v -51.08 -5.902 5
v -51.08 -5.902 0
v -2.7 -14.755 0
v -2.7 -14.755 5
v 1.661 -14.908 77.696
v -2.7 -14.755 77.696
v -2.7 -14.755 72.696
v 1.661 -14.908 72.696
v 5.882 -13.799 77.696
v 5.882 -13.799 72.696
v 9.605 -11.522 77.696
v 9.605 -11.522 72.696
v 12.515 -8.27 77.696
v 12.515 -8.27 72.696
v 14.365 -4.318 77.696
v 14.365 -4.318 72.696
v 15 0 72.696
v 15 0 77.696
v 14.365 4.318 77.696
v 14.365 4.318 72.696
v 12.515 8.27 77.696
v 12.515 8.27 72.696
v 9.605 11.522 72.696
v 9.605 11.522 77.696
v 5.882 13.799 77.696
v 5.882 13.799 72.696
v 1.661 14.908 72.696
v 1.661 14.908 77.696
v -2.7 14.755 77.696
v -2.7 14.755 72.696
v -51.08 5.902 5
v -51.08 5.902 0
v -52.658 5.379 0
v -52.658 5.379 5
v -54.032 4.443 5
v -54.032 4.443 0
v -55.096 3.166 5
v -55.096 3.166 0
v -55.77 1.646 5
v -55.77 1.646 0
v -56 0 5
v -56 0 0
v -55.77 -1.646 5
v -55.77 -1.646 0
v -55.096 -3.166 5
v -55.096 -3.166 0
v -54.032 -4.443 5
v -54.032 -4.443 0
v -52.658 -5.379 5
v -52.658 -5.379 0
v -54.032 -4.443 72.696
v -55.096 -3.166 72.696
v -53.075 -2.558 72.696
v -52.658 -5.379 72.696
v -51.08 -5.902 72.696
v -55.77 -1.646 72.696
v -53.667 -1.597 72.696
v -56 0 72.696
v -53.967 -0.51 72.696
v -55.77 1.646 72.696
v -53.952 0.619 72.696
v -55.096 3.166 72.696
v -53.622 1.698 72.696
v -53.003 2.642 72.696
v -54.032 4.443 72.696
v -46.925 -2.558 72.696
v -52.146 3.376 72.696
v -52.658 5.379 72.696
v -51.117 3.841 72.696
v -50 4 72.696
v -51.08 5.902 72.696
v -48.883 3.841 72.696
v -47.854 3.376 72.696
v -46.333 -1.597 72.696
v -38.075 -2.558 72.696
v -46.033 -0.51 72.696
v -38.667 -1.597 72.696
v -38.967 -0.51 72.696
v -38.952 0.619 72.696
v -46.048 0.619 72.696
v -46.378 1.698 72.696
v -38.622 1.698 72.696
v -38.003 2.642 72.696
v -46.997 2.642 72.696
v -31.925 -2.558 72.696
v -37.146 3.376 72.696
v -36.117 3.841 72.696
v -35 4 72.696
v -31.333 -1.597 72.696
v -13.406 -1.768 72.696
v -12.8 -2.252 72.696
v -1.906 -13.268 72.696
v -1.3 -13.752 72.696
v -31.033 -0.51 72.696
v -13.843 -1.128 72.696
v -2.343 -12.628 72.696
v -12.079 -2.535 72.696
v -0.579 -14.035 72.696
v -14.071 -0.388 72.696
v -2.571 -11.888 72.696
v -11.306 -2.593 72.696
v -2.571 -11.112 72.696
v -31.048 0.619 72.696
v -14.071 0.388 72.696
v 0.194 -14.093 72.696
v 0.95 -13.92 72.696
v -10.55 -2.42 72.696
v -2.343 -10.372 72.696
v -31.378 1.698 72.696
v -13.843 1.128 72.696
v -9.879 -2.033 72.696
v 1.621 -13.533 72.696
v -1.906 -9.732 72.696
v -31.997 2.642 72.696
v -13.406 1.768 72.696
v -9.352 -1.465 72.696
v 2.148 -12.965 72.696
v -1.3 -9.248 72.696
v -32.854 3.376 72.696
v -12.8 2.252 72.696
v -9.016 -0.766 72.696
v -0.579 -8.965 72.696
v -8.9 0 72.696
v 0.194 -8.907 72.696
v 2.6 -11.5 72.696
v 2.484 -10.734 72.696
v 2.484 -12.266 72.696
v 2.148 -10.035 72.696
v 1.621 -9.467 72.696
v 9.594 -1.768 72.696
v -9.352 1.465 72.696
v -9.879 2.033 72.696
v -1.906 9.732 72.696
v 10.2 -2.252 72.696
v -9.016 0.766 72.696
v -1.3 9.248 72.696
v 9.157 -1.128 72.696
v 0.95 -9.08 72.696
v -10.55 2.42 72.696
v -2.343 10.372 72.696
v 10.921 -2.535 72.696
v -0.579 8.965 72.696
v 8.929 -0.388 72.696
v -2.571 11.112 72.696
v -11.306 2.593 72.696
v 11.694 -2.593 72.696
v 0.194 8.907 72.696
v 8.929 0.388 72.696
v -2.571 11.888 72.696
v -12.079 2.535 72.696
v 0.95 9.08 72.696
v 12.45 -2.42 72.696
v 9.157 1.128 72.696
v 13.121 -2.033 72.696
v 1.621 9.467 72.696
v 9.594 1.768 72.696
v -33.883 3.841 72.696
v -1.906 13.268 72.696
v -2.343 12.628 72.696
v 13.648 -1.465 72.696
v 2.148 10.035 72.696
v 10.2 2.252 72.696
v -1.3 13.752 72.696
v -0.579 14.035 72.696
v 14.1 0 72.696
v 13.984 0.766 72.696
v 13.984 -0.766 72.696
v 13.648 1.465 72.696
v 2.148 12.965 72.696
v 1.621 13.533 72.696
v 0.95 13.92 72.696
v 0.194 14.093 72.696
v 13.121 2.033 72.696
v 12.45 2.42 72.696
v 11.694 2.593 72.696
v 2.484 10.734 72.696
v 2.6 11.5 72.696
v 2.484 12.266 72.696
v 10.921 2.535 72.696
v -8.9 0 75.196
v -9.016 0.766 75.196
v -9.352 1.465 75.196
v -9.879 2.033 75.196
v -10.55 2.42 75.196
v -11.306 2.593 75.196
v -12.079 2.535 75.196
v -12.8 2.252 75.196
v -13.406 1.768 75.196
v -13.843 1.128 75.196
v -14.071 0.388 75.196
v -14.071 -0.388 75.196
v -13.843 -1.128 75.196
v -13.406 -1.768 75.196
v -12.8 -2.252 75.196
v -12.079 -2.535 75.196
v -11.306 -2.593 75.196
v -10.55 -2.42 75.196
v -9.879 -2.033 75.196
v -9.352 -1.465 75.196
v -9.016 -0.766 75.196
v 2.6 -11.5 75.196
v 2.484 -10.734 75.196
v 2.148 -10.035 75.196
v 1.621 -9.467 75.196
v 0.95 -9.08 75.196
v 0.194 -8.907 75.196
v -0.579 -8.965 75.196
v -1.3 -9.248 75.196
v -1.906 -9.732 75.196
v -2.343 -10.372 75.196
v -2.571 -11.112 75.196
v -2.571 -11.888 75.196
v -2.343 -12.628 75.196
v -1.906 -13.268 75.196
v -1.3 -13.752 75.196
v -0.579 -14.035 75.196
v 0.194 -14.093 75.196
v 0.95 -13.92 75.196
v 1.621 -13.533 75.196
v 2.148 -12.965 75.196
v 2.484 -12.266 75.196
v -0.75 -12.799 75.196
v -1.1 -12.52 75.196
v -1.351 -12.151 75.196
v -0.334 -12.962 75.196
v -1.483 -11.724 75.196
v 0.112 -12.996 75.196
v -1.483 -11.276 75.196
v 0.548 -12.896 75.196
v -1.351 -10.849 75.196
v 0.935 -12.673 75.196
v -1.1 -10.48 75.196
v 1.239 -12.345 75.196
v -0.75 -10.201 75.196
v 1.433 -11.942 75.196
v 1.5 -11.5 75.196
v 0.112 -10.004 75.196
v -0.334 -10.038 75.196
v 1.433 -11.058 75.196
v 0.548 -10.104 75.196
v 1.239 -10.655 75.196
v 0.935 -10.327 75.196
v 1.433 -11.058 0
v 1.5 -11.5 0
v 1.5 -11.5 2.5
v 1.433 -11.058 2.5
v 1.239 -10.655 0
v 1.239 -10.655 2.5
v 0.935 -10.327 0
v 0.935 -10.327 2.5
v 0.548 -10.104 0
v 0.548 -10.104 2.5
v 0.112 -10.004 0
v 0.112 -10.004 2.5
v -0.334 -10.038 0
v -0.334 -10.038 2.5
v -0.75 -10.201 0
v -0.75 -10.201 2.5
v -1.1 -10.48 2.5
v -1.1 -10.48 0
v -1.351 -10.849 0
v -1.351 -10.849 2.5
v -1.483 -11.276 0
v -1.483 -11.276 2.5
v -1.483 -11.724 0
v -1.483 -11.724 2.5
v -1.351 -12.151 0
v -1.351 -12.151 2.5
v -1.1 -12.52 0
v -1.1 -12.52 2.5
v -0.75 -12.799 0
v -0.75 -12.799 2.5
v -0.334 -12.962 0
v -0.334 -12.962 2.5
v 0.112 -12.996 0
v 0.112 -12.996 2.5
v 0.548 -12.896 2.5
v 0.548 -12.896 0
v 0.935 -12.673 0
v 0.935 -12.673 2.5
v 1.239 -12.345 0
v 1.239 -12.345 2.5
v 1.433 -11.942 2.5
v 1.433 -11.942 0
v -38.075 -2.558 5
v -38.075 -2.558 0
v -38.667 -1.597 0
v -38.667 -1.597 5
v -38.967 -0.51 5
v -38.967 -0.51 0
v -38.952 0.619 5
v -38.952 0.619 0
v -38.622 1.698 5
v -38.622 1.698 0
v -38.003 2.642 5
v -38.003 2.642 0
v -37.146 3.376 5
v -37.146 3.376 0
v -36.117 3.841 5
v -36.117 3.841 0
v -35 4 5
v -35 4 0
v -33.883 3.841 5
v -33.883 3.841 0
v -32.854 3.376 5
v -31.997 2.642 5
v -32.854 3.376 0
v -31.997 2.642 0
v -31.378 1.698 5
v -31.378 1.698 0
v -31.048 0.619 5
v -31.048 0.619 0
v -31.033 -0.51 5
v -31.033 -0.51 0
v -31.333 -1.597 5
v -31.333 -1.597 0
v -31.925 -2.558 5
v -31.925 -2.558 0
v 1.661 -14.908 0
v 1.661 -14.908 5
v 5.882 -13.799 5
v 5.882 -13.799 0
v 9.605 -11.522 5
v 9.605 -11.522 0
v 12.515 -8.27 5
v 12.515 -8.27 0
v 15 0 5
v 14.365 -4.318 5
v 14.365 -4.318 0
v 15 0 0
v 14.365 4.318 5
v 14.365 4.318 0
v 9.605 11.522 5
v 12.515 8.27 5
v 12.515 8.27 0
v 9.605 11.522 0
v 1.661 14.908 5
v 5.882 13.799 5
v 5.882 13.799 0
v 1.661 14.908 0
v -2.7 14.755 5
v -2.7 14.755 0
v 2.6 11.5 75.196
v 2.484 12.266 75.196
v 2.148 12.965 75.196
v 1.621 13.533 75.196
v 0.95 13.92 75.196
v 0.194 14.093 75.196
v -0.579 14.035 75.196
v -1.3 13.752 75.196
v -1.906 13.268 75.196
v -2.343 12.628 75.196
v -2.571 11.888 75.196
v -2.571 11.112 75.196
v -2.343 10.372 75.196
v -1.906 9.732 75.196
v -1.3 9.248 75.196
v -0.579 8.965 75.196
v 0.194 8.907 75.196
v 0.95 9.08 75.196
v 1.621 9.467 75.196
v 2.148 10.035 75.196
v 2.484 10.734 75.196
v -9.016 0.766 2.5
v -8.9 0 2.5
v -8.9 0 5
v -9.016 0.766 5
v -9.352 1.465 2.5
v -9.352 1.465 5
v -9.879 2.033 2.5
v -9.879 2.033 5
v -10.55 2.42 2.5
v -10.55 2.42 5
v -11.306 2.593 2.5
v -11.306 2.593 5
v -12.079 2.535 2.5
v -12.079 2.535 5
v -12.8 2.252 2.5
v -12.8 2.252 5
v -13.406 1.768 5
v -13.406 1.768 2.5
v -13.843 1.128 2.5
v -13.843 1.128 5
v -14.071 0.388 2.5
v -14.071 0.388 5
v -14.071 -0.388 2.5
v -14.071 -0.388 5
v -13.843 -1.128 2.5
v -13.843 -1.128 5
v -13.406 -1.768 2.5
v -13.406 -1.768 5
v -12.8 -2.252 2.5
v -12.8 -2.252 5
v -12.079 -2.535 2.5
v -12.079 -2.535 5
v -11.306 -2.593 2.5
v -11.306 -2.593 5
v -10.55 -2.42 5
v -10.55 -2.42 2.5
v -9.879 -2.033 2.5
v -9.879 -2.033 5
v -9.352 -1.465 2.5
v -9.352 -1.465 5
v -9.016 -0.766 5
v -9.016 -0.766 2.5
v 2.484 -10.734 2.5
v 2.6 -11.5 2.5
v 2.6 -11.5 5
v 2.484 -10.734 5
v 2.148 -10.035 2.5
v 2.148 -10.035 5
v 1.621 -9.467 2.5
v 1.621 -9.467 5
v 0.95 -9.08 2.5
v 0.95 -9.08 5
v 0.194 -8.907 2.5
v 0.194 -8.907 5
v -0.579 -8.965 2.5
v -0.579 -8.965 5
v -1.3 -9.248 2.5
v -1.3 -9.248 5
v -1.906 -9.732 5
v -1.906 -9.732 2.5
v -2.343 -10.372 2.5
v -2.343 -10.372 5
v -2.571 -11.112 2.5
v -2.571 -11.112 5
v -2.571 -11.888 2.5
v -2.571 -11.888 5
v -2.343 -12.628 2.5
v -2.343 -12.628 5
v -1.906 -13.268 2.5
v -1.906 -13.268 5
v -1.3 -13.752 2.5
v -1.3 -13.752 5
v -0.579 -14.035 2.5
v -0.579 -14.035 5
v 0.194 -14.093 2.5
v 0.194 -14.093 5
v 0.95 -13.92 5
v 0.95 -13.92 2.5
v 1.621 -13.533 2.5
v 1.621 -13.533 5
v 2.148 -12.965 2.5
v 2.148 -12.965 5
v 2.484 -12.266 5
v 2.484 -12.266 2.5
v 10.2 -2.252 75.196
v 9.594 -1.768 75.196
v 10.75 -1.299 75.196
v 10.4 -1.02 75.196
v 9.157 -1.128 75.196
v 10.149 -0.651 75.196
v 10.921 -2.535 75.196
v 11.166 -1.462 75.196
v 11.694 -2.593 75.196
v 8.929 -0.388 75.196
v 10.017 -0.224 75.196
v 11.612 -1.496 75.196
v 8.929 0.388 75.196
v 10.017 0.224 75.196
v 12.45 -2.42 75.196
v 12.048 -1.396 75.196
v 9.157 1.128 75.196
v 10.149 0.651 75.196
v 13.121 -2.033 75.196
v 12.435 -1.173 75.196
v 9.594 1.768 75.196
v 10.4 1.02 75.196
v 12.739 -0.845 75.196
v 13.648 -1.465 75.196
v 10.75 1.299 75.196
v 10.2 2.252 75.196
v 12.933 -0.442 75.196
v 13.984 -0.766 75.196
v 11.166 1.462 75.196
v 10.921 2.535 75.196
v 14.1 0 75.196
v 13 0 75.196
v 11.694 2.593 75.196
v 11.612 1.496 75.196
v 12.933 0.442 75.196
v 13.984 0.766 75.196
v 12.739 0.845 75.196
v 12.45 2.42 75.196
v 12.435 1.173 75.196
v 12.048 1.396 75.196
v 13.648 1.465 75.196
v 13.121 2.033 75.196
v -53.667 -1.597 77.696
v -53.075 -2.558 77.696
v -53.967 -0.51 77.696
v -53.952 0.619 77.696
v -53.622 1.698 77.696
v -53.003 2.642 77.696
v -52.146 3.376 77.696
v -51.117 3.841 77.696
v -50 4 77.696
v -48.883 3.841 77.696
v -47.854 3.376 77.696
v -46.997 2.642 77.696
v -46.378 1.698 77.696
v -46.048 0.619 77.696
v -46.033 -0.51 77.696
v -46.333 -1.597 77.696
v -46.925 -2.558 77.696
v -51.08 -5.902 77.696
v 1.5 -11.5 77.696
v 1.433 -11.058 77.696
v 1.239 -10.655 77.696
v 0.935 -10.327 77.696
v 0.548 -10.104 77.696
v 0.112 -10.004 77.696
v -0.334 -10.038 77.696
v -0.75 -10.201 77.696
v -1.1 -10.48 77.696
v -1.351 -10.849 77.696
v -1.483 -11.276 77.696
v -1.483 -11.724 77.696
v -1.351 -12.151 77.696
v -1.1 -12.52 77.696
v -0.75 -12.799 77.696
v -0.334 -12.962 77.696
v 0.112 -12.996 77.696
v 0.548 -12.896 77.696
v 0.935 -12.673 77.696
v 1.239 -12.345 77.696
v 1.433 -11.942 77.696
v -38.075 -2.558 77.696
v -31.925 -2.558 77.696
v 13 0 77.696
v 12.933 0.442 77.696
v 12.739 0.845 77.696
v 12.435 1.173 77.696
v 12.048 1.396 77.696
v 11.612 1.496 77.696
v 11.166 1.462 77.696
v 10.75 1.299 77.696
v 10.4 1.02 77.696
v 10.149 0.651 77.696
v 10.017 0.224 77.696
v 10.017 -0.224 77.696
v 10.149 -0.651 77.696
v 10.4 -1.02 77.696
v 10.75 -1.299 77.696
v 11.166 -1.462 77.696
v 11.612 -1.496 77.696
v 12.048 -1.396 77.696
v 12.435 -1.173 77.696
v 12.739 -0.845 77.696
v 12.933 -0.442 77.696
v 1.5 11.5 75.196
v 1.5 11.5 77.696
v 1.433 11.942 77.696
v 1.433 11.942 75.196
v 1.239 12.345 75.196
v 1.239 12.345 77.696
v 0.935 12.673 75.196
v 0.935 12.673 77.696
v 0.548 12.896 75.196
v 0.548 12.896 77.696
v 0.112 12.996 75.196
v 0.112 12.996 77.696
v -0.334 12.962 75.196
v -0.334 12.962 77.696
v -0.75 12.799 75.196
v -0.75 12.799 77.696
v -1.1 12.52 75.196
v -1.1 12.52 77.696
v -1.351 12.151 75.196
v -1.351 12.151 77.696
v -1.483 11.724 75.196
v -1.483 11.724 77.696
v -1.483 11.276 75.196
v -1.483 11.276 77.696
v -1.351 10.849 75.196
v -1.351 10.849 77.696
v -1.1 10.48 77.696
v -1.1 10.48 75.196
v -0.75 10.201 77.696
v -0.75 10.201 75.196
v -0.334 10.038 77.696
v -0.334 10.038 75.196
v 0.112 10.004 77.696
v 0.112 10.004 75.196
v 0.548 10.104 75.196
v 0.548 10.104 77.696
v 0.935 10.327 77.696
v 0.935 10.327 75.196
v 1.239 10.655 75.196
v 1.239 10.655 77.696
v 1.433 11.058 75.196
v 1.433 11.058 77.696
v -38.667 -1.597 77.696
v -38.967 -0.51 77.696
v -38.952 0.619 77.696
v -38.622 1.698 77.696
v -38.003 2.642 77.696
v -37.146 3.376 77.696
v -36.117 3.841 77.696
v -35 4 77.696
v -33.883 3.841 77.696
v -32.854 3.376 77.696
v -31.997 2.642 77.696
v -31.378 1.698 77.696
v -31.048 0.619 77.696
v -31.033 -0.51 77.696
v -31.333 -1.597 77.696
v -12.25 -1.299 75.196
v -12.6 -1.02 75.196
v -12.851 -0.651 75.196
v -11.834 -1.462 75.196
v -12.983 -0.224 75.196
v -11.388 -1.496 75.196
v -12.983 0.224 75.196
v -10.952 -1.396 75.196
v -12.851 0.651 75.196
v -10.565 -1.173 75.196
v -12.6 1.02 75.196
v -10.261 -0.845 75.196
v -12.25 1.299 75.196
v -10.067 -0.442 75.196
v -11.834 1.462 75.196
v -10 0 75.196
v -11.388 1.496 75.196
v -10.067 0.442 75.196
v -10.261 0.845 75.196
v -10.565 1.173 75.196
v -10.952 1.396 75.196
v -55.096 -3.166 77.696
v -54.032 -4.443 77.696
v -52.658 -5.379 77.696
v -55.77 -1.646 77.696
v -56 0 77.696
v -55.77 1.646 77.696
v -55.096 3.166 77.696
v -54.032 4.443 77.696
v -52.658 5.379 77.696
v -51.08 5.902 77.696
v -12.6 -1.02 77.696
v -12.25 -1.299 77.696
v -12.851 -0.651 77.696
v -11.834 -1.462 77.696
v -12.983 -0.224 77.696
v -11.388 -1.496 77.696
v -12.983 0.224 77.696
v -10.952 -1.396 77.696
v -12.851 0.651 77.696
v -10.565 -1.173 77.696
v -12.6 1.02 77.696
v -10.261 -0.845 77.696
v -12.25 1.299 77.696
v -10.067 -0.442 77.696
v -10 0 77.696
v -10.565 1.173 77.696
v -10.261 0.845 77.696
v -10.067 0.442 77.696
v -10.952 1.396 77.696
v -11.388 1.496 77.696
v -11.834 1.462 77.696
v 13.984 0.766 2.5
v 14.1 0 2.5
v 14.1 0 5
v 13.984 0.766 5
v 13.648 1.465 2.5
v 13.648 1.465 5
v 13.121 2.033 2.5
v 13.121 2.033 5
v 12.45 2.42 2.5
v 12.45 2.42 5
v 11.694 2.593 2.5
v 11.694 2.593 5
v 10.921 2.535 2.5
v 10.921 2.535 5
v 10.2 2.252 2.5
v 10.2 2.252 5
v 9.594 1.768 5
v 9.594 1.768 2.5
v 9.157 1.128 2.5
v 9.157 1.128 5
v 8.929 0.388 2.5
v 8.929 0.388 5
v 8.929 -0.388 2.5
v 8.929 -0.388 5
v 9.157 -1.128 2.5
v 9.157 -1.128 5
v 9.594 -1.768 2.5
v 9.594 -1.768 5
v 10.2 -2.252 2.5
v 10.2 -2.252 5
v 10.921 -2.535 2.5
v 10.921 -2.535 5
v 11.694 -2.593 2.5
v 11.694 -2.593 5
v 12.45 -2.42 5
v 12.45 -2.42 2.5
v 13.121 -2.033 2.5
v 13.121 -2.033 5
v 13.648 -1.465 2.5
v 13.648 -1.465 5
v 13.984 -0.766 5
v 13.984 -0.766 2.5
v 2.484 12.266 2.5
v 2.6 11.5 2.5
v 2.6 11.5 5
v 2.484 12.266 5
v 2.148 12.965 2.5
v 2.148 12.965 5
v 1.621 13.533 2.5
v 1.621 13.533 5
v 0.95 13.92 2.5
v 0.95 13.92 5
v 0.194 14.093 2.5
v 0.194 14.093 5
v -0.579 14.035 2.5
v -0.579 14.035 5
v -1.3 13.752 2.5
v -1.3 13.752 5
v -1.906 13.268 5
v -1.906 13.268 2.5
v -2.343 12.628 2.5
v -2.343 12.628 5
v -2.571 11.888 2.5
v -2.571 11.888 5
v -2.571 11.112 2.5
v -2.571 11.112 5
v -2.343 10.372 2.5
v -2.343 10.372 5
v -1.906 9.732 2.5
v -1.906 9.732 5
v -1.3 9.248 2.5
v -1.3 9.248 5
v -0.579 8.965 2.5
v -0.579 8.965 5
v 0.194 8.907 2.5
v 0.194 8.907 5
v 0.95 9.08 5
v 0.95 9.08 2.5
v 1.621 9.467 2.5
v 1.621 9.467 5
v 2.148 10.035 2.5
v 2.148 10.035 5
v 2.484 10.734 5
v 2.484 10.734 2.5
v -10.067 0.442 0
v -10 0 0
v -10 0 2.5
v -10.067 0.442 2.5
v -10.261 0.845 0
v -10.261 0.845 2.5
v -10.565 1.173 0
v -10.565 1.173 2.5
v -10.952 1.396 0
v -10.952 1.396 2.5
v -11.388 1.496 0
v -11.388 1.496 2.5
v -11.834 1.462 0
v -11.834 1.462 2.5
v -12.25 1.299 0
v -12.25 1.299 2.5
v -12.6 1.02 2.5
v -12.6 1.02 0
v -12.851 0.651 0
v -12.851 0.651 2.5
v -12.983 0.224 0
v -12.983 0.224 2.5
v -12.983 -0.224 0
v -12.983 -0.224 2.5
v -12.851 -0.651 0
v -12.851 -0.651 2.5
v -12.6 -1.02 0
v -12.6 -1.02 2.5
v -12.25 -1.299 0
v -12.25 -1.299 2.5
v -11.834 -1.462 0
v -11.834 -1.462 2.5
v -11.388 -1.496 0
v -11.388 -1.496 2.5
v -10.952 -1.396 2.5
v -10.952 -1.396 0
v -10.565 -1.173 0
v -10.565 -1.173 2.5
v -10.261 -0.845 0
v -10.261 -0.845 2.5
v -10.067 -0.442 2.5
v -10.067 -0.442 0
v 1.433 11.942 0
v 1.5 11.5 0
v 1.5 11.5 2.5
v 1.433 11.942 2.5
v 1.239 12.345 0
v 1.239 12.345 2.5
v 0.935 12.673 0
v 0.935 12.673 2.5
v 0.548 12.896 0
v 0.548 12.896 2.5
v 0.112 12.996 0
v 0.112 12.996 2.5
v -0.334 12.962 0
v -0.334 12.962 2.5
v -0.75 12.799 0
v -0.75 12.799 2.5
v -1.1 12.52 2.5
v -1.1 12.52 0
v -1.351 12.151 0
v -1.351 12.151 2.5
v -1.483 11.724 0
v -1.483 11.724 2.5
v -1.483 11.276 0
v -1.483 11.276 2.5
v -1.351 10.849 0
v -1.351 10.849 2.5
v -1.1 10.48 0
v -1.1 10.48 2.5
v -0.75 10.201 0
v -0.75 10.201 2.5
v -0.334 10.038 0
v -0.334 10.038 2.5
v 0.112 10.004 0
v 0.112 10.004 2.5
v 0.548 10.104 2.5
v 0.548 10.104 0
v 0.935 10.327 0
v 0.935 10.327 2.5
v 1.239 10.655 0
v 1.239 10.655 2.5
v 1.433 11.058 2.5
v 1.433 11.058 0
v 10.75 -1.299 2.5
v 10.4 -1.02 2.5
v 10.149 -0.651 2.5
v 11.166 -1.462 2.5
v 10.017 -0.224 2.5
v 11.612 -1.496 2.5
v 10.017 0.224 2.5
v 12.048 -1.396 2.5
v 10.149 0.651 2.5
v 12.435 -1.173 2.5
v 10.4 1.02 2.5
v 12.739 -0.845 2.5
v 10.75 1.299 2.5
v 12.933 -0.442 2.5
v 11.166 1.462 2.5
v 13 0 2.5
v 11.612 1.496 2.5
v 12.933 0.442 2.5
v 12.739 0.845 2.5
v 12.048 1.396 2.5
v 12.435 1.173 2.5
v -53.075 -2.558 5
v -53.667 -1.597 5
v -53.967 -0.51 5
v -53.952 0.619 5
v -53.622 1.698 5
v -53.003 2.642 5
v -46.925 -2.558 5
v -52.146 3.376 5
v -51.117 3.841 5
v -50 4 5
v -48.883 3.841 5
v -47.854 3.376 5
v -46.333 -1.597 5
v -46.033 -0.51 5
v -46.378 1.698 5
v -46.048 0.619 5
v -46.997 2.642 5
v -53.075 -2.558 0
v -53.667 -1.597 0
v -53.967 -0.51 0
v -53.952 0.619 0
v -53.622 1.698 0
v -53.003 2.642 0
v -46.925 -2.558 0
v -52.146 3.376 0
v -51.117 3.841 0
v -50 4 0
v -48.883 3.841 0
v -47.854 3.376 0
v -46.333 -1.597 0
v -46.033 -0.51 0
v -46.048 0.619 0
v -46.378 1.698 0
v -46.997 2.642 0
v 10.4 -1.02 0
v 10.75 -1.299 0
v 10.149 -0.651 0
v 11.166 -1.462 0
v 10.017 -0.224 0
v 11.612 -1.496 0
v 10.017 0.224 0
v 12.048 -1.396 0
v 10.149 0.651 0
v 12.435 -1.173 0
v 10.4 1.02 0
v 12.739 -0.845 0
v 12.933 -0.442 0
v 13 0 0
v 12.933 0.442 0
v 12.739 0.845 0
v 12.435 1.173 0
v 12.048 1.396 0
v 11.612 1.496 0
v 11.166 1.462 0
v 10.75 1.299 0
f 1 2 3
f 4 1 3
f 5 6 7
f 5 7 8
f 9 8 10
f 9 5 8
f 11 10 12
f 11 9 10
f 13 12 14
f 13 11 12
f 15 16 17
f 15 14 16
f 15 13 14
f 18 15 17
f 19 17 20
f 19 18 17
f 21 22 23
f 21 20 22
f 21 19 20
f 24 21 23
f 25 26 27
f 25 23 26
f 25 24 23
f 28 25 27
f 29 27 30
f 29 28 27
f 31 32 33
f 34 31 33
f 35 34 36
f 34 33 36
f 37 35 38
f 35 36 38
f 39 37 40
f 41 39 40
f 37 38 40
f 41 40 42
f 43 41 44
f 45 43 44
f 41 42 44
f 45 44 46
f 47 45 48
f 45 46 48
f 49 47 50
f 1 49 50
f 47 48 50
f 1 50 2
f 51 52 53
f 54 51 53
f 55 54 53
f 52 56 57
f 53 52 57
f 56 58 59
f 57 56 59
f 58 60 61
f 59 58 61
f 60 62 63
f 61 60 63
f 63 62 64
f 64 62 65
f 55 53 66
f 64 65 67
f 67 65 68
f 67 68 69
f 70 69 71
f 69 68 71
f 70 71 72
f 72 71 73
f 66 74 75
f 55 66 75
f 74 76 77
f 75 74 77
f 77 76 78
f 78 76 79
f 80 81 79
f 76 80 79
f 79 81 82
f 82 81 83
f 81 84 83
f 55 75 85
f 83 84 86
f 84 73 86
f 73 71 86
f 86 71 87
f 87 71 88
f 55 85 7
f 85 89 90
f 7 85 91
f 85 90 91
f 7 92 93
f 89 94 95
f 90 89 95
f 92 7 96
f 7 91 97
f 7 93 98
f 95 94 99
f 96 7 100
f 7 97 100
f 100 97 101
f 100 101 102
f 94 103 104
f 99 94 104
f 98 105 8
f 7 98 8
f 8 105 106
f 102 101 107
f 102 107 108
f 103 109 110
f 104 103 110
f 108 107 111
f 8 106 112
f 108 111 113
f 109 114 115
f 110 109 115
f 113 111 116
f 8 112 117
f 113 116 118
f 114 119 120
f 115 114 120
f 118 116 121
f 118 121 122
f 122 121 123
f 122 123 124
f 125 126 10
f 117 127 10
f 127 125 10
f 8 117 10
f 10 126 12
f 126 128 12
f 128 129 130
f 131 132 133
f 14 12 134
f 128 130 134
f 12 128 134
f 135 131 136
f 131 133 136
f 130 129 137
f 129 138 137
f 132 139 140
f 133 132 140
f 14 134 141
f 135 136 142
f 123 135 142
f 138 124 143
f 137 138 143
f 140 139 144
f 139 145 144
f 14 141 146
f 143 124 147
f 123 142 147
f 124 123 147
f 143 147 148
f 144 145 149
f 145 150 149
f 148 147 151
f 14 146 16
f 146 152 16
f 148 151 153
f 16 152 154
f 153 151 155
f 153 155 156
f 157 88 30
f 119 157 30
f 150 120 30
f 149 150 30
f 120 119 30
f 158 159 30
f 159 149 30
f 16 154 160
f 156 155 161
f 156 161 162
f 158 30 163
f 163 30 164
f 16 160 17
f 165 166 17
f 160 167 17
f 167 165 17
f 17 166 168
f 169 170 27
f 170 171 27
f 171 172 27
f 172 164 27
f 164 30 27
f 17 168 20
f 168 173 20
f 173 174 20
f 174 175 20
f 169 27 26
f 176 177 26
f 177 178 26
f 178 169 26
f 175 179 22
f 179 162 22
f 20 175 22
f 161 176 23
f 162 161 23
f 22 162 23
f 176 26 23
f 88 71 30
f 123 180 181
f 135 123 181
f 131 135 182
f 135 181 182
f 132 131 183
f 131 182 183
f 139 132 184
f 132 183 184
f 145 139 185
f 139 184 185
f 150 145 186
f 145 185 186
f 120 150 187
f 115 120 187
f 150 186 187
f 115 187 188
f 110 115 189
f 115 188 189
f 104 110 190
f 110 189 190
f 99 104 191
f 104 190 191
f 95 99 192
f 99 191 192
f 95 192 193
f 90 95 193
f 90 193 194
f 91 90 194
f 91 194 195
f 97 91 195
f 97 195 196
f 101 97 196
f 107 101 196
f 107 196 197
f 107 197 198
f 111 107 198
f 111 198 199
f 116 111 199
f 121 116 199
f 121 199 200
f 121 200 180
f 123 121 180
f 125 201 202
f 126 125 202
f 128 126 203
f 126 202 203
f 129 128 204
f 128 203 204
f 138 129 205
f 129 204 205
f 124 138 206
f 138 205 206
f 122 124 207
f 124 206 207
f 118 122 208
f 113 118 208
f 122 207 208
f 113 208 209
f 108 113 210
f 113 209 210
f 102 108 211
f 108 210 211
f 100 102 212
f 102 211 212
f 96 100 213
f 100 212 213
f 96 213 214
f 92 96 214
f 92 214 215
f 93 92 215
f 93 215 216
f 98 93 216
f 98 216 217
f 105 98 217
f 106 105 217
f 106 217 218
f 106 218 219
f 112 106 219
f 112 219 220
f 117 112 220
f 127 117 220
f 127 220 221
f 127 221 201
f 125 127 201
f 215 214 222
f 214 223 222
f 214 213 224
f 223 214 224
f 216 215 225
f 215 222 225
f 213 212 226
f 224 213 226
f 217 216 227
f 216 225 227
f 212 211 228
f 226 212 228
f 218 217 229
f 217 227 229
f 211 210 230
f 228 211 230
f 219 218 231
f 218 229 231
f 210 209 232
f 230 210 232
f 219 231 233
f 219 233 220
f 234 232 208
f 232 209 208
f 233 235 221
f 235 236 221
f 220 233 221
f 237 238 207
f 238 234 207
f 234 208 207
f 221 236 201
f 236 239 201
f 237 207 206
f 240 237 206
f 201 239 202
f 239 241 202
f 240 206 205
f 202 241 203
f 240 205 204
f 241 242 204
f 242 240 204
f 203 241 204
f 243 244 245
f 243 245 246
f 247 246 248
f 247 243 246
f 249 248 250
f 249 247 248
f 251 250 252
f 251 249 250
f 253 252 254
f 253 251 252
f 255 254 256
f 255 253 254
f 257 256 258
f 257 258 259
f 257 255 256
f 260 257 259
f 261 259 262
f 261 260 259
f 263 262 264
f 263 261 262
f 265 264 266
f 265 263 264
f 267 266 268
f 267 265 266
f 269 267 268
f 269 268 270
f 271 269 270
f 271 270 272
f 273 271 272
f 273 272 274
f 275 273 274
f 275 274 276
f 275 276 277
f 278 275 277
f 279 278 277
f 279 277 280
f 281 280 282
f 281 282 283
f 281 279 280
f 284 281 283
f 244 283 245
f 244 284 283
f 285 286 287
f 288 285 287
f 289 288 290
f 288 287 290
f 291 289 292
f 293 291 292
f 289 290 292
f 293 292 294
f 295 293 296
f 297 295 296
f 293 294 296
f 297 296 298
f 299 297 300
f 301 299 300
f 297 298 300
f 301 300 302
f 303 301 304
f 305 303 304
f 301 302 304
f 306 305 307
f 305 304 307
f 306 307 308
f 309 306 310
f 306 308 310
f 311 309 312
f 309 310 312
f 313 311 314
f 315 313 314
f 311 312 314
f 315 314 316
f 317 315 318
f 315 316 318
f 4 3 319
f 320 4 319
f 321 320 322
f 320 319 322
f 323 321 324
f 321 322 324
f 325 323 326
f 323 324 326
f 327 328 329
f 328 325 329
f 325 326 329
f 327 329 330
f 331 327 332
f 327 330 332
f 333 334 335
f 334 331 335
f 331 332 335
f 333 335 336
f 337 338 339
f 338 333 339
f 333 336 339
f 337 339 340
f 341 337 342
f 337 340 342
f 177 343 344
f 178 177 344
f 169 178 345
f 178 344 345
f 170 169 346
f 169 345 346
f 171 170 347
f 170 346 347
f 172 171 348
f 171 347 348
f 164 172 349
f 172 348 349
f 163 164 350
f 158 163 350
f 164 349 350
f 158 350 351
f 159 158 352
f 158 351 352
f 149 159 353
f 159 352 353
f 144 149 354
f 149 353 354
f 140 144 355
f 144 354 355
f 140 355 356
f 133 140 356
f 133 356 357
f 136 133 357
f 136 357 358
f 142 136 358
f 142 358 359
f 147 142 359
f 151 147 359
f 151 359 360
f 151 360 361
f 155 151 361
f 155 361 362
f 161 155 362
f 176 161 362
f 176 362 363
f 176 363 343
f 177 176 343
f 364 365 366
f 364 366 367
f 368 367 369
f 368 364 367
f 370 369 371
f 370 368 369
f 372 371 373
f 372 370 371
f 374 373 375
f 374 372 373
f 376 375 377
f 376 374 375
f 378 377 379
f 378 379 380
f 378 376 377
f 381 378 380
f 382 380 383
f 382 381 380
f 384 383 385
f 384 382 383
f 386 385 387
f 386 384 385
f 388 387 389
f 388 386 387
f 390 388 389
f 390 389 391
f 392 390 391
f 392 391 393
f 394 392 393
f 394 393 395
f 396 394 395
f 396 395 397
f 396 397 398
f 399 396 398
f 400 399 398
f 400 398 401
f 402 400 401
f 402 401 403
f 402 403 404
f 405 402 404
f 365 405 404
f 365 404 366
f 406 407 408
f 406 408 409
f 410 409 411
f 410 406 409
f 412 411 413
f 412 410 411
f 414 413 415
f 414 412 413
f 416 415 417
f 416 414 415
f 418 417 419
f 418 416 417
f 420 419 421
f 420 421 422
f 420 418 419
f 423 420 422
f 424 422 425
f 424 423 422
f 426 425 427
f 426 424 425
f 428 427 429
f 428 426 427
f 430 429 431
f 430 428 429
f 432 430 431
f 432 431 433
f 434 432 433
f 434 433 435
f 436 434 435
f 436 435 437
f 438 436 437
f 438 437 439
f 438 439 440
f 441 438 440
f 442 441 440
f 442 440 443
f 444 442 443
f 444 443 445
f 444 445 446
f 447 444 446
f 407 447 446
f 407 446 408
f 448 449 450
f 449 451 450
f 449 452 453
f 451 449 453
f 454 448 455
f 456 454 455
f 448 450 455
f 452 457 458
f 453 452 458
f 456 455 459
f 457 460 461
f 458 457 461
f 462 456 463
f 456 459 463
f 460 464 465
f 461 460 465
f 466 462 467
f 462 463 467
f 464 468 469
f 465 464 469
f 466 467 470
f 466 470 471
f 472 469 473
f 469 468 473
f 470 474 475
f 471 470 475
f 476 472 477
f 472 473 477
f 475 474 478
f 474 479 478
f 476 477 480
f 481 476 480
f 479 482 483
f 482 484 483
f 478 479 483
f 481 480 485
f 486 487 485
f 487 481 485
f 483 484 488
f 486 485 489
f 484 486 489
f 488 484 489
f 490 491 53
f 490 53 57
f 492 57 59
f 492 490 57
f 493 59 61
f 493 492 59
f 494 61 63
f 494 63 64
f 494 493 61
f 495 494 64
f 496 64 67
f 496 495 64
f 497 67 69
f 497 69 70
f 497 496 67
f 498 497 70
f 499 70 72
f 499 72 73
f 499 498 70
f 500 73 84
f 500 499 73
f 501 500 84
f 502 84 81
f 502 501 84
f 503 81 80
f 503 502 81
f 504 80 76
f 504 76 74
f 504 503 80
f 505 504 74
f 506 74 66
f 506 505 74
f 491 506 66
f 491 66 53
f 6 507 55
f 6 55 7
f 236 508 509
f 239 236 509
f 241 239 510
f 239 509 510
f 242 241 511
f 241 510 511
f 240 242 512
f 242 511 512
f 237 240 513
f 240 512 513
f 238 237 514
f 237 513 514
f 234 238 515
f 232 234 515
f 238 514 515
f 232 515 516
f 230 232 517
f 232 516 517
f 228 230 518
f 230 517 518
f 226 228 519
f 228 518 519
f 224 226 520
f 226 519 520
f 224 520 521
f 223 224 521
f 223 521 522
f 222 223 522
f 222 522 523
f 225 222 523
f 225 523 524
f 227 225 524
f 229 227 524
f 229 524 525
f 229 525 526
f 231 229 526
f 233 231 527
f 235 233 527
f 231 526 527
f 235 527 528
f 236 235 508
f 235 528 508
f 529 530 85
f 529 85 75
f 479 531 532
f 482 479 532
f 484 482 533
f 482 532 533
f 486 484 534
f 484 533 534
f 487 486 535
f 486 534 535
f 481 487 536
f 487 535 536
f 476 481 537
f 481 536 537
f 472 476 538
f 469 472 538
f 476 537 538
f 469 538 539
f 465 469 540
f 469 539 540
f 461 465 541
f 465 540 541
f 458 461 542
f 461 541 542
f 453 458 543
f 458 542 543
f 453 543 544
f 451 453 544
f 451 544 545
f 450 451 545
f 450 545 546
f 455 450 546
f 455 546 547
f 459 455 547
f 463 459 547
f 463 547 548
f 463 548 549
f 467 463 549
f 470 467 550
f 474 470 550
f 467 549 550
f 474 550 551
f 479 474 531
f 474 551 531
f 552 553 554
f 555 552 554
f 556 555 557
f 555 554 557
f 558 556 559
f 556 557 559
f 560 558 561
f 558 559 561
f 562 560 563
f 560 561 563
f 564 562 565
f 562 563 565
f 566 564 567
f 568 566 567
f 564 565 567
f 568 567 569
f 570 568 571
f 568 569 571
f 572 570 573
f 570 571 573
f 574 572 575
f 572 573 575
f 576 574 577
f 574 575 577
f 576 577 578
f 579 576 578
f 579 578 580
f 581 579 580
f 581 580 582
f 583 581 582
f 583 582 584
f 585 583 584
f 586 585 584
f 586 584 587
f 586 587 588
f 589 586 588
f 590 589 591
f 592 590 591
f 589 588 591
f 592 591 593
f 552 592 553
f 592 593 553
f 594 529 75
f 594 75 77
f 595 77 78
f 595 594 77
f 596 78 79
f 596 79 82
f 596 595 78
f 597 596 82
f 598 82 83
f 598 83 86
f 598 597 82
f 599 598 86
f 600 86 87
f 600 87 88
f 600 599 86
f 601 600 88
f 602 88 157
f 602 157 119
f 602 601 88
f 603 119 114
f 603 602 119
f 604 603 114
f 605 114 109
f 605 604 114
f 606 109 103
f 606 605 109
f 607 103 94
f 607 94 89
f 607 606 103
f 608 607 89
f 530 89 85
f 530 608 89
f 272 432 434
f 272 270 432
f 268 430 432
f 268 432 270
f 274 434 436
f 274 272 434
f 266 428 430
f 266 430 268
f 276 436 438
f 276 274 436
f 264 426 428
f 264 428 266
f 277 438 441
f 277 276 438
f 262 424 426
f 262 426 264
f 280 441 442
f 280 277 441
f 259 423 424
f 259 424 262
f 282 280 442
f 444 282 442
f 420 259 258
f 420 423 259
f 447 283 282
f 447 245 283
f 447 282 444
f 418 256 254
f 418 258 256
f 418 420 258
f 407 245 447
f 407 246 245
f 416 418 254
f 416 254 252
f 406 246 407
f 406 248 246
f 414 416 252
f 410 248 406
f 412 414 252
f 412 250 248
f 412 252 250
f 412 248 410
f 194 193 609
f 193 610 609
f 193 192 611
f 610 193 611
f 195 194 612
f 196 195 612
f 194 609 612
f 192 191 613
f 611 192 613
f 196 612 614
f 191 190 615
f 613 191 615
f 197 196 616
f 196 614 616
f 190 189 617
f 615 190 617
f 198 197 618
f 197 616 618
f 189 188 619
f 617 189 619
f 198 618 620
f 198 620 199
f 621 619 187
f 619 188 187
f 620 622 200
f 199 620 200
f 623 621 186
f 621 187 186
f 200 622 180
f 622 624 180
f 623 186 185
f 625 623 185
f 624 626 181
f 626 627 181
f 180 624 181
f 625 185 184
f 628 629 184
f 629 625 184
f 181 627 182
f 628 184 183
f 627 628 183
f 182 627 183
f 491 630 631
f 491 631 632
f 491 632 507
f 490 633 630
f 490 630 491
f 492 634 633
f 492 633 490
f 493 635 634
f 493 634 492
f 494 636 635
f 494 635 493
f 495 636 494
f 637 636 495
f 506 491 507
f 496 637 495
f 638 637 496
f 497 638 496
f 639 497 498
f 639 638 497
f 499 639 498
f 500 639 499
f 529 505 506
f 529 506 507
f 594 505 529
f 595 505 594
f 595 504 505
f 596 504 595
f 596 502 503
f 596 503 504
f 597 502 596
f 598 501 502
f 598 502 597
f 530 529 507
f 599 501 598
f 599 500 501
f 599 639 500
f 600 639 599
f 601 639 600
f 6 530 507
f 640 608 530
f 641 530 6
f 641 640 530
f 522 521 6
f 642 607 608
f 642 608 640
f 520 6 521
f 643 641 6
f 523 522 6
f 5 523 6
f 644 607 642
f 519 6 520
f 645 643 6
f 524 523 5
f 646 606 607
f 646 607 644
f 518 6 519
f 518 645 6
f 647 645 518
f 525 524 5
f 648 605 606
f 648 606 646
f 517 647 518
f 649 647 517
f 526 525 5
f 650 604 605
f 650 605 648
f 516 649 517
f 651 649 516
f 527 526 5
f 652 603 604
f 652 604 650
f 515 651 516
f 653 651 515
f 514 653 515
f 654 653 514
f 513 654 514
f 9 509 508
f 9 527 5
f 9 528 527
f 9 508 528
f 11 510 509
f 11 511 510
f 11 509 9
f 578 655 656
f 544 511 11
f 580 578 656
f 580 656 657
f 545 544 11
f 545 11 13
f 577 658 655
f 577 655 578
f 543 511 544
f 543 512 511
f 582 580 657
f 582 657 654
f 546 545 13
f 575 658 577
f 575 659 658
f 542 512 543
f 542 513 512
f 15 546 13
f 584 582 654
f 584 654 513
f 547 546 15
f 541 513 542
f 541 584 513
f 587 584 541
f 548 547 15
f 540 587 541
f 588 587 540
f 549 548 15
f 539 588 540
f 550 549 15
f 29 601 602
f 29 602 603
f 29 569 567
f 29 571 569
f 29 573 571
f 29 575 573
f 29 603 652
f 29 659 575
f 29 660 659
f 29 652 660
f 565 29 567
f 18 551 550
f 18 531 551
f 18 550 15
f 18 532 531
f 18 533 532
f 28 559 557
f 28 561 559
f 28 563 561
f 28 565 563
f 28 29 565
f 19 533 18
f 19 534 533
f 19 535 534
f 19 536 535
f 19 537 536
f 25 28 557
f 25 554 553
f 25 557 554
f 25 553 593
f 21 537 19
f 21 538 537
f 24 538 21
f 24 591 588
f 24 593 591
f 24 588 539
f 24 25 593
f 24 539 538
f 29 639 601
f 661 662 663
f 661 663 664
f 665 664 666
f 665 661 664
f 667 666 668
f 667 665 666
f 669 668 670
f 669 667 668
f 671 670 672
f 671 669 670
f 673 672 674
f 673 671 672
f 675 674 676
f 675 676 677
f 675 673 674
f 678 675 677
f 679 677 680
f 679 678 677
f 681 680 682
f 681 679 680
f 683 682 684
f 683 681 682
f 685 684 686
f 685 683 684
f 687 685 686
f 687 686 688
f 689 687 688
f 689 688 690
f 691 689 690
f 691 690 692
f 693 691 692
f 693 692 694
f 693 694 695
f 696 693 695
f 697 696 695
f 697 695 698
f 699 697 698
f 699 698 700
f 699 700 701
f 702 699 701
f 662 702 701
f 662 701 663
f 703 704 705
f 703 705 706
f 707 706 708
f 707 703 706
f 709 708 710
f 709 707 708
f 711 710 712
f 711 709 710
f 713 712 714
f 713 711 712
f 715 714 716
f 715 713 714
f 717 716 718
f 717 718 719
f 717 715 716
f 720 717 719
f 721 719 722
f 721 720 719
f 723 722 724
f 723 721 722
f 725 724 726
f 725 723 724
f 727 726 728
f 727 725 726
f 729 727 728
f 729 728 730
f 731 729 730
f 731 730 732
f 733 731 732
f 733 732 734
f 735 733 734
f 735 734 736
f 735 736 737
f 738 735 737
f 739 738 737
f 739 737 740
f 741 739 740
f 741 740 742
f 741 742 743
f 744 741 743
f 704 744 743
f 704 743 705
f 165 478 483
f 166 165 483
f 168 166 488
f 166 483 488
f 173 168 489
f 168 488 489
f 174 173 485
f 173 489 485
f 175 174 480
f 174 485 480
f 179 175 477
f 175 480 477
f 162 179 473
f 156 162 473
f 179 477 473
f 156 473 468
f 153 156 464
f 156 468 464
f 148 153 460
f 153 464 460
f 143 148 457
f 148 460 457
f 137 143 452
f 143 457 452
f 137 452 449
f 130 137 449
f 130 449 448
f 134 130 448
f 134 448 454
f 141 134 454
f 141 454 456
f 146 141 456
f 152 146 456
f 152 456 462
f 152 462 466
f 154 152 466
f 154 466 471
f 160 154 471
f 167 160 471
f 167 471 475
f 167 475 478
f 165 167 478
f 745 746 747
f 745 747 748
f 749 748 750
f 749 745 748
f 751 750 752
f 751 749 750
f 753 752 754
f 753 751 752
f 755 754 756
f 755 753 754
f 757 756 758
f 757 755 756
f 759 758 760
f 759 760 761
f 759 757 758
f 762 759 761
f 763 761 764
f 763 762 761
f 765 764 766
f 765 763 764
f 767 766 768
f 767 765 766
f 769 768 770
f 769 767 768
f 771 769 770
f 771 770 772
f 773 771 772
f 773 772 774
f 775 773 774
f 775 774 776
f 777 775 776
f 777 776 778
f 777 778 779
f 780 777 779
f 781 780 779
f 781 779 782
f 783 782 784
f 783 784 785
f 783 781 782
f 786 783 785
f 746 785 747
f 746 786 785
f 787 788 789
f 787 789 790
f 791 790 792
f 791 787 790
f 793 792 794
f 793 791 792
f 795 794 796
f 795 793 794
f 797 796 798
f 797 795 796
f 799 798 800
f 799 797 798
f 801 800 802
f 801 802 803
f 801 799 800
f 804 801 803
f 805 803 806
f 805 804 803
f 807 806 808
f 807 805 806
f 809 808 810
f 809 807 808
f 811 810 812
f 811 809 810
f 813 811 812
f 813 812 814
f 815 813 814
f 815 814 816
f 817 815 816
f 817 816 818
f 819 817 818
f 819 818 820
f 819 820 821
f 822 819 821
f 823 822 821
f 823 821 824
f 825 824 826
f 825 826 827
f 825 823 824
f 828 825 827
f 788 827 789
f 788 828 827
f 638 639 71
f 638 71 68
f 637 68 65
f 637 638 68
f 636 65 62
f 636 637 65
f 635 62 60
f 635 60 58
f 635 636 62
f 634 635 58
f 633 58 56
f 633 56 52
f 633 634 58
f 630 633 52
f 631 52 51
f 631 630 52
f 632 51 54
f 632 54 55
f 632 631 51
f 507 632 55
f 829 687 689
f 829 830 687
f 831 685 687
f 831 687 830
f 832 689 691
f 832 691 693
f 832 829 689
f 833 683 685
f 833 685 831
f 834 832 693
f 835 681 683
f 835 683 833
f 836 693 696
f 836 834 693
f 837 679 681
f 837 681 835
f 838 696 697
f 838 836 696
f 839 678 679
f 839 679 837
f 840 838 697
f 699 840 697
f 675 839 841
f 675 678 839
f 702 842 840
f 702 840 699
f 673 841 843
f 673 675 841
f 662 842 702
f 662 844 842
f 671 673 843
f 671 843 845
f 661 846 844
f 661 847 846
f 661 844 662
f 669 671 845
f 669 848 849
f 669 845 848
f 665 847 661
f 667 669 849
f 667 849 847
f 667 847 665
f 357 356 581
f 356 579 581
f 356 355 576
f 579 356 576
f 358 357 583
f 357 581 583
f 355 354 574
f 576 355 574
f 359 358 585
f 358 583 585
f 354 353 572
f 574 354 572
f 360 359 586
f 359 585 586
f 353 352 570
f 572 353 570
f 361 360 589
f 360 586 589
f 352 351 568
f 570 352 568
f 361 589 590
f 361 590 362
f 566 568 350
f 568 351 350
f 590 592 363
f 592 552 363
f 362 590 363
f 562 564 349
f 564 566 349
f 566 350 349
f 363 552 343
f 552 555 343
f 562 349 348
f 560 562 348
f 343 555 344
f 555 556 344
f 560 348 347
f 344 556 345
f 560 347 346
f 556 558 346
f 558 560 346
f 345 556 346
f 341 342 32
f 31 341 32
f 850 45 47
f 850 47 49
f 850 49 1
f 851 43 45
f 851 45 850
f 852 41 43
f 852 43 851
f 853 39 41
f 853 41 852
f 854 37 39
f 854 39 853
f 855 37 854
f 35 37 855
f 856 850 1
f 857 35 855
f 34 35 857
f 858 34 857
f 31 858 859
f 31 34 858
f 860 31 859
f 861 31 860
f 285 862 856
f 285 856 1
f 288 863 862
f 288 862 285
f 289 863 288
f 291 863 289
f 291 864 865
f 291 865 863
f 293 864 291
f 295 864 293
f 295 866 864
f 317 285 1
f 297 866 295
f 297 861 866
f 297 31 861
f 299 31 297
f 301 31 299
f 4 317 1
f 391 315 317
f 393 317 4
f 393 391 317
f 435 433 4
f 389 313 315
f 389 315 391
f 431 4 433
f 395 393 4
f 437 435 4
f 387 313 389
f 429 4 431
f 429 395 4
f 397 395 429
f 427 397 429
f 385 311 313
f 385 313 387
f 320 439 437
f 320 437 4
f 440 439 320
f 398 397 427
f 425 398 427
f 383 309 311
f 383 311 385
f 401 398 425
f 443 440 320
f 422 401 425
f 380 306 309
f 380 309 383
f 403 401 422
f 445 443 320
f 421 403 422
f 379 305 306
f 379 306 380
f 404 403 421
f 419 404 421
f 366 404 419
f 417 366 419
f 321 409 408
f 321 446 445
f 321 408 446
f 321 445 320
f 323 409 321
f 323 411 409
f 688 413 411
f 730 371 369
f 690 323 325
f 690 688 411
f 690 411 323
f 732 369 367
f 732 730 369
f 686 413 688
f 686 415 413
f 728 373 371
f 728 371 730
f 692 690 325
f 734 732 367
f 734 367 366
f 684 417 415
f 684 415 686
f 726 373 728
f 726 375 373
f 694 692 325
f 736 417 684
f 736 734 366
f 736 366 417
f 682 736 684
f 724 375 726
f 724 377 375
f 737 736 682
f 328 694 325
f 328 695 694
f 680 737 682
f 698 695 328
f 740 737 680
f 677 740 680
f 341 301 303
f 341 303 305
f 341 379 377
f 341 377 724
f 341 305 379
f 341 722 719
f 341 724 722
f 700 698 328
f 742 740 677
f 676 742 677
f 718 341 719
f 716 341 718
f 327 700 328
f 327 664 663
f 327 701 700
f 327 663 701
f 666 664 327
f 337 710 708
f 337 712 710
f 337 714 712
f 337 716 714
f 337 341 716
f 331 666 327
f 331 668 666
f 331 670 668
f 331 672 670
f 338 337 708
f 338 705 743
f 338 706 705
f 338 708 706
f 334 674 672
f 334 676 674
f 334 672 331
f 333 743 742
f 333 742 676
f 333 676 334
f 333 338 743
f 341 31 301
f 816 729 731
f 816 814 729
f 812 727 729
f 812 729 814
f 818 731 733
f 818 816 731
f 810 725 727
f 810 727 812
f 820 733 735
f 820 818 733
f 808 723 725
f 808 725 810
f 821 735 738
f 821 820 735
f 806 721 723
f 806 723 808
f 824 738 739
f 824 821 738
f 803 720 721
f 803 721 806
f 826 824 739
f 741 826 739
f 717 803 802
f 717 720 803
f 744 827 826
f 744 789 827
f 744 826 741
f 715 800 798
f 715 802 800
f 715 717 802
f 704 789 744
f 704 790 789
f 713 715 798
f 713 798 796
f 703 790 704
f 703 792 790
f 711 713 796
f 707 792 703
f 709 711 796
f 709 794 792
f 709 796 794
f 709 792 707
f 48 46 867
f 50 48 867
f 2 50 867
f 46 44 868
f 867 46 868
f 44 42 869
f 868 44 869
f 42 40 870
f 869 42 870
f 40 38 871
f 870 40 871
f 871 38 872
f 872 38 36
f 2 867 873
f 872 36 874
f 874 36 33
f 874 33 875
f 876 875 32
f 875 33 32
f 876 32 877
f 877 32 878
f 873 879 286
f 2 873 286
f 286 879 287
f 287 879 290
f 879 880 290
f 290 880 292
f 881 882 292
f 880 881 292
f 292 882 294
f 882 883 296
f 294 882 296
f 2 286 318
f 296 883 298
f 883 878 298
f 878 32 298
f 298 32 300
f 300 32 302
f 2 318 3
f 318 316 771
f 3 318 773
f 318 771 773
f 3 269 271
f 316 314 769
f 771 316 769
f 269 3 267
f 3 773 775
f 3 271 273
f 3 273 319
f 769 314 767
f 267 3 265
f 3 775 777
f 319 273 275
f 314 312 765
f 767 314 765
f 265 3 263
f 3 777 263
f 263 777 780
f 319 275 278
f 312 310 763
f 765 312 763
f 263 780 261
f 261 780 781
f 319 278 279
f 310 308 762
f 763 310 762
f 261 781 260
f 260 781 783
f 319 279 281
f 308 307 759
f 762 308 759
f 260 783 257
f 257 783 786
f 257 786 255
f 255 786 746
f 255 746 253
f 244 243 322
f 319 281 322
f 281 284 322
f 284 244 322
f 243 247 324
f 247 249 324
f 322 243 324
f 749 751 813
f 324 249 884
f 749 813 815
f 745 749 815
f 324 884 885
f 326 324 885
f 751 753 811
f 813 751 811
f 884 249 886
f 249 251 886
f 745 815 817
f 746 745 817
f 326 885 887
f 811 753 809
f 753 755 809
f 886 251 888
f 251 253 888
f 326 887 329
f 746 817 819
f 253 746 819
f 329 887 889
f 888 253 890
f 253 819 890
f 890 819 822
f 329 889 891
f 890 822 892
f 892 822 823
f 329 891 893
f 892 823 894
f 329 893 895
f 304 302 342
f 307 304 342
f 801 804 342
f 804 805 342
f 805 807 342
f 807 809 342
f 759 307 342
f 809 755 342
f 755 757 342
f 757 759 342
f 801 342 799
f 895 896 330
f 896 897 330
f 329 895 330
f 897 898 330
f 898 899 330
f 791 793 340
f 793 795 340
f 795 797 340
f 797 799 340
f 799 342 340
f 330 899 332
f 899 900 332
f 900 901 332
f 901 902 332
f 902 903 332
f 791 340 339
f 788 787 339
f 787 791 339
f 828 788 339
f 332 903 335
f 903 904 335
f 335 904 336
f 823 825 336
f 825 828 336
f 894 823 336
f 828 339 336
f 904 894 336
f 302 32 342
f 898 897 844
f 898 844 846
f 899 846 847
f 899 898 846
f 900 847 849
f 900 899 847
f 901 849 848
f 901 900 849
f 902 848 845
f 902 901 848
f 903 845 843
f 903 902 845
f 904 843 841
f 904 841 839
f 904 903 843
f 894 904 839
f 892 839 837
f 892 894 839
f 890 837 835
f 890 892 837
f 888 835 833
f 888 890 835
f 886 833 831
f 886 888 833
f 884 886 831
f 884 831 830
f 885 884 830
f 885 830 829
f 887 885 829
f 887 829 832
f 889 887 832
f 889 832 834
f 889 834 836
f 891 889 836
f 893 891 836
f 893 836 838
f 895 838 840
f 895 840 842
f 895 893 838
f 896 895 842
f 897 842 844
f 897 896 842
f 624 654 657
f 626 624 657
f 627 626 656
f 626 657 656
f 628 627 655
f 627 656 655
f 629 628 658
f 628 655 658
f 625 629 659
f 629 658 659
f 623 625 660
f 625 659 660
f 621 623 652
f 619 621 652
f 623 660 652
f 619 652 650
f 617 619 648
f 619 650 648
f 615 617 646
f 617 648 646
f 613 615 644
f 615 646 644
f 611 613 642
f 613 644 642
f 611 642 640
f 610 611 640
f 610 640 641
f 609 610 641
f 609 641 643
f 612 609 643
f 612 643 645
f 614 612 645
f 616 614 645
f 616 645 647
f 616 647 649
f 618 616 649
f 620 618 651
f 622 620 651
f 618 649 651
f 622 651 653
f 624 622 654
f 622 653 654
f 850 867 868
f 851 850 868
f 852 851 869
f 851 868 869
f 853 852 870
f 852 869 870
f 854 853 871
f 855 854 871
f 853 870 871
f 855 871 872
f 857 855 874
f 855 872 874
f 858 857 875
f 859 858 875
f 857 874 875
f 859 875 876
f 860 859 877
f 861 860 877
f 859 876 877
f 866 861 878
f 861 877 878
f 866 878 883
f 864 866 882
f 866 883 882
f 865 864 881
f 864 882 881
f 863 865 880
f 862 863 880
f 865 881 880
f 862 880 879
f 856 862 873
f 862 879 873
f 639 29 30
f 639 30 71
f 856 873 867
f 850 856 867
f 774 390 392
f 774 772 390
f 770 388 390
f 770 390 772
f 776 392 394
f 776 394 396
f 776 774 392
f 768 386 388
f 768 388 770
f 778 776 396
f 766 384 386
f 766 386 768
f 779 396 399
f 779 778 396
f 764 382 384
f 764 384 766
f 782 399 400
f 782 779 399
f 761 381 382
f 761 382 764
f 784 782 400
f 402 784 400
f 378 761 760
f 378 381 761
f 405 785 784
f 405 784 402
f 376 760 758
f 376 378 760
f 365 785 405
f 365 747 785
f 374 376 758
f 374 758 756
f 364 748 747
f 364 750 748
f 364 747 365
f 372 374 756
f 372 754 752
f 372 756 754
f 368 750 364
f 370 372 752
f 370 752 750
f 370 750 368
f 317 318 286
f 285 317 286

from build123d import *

# Parameters (mm, degrees)
SKETCH1_R           = 15
SKETCH1_R_2         = 2.6
BOSS_EXTRUDE1_DEPTH = 5
SKETCH1_3_R         = 2.6
SKETCH1_3_R_2       = 1.5
BOSS_EXTRUDE2_DEPTH = 2.5
BOSS_EXTRUDE3_DEPTH = 5


with BuildPart() as part:
    # Sketch1 → Boss-Extrude1 (new body)
    with BuildSketch(Plane.XY):
        Circle(SKETCH1_R)
        with Locations((-11.5, 0)):
            Circle(SKETCH1_R_2, mode=Mode.SUBTRACT)
        with Locations((0, -11.5)):
            Circle(SKETCH1_R_2, mode=Mode.SUBTRACT)
        with Locations((11.5, 0)):
            Circle(SKETCH1_R_2, mode=Mode.SUBTRACT)
        with Locations((0, 11.5)):
            Circle(SKETCH1_R_2, mode=Mode.SUBTRACT)
    extrude(amount=BOSS_EXTRUDE1_DEPTH)

    # Sketch1<3> → Boss-Extrude2 (add)
    # profile 1 of 4: a face of its own
    with BuildSketch(Plane.XY):
        with Locations((0, 11.5)):
            Circle(SKETCH1_3_R)
        with Locations((0, 11.5)):
            Circle(SKETCH1_3_R_2, mode=Mode.SUBTRACT)
    # profile 2 of 4: a face of its own
    with BuildSketch(Plane.XY):
        with Locations((-11.5, 0)):
            Circle(SKETCH1_3_R)
        with Locations((-11.5, 0)):
            Circle(SKETCH1_3_R_2, mode=Mode.SUBTRACT)
    # profile 3 of 4: a face of its own
    with BuildSketch(Plane.XY):
        with Locations((0, -11.5)):
            Circle(SKETCH1_3_R)
        with Locations((0, -11.5)):
            Circle(SKETCH1_3_R_2, mode=Mode.SUBTRACT)
    # profile 4 of 4: a face of its own
    with BuildSketch(Plane.XY):
        with Locations((11.5, 0)):
            Circle(SKETCH1_3_R)
        with Locations((11.5, 0)):
            Circle(SKETCH1_3_R_2, mode=Mode.SUBTRACT)
    extrude(amount=BOSS_EXTRUDE2_DEPTH)

    # Sketch2 → Boss-Extrude3 (add)
    with BuildSketch(Plane.XY):
        with BuildLine():
            Line((-2.7, 14.754999153), (-51.08, 5.901999661))
            ThreePointArc((-51.08, 5.901999661), (-56, 0), (-51.08, -5.901999661))
            Line((-51.08, -5.901999661), (-2.7, -14.754999153))
            ThreePointArc((-2.7, -14.754999153), (-15, 0), (-2.7, 14.754999153))
        make_face()
        with BuildLine():
            Line((-46.925, -2.558197608), (-53.075, -2.558197608))
            ThreePointArc((-53.075, -2.558197608), (-50, 4), (-46.925, -2.558197608))
        make_face(mode=Mode.SUBTRACT)
        with BuildLine():
            Line((-31.925, -2.558197608), (-38.075, -2.558197608))
            ThreePointArc((-38.075, -2.558197608), (-35, 4), (-31.925, -2.558197608))
        make_face(mode=Mode.SUBTRACT)
    extrude(amount=BOSS_EXTRUDE3_DEPTH)


with BuildPart() as body_2:
    # Mirror2: mirrored copy
    add(part.part.mirror(Plane.XY.offset(38.847994838)))


solid = Compound([part.part, body_2.part])
